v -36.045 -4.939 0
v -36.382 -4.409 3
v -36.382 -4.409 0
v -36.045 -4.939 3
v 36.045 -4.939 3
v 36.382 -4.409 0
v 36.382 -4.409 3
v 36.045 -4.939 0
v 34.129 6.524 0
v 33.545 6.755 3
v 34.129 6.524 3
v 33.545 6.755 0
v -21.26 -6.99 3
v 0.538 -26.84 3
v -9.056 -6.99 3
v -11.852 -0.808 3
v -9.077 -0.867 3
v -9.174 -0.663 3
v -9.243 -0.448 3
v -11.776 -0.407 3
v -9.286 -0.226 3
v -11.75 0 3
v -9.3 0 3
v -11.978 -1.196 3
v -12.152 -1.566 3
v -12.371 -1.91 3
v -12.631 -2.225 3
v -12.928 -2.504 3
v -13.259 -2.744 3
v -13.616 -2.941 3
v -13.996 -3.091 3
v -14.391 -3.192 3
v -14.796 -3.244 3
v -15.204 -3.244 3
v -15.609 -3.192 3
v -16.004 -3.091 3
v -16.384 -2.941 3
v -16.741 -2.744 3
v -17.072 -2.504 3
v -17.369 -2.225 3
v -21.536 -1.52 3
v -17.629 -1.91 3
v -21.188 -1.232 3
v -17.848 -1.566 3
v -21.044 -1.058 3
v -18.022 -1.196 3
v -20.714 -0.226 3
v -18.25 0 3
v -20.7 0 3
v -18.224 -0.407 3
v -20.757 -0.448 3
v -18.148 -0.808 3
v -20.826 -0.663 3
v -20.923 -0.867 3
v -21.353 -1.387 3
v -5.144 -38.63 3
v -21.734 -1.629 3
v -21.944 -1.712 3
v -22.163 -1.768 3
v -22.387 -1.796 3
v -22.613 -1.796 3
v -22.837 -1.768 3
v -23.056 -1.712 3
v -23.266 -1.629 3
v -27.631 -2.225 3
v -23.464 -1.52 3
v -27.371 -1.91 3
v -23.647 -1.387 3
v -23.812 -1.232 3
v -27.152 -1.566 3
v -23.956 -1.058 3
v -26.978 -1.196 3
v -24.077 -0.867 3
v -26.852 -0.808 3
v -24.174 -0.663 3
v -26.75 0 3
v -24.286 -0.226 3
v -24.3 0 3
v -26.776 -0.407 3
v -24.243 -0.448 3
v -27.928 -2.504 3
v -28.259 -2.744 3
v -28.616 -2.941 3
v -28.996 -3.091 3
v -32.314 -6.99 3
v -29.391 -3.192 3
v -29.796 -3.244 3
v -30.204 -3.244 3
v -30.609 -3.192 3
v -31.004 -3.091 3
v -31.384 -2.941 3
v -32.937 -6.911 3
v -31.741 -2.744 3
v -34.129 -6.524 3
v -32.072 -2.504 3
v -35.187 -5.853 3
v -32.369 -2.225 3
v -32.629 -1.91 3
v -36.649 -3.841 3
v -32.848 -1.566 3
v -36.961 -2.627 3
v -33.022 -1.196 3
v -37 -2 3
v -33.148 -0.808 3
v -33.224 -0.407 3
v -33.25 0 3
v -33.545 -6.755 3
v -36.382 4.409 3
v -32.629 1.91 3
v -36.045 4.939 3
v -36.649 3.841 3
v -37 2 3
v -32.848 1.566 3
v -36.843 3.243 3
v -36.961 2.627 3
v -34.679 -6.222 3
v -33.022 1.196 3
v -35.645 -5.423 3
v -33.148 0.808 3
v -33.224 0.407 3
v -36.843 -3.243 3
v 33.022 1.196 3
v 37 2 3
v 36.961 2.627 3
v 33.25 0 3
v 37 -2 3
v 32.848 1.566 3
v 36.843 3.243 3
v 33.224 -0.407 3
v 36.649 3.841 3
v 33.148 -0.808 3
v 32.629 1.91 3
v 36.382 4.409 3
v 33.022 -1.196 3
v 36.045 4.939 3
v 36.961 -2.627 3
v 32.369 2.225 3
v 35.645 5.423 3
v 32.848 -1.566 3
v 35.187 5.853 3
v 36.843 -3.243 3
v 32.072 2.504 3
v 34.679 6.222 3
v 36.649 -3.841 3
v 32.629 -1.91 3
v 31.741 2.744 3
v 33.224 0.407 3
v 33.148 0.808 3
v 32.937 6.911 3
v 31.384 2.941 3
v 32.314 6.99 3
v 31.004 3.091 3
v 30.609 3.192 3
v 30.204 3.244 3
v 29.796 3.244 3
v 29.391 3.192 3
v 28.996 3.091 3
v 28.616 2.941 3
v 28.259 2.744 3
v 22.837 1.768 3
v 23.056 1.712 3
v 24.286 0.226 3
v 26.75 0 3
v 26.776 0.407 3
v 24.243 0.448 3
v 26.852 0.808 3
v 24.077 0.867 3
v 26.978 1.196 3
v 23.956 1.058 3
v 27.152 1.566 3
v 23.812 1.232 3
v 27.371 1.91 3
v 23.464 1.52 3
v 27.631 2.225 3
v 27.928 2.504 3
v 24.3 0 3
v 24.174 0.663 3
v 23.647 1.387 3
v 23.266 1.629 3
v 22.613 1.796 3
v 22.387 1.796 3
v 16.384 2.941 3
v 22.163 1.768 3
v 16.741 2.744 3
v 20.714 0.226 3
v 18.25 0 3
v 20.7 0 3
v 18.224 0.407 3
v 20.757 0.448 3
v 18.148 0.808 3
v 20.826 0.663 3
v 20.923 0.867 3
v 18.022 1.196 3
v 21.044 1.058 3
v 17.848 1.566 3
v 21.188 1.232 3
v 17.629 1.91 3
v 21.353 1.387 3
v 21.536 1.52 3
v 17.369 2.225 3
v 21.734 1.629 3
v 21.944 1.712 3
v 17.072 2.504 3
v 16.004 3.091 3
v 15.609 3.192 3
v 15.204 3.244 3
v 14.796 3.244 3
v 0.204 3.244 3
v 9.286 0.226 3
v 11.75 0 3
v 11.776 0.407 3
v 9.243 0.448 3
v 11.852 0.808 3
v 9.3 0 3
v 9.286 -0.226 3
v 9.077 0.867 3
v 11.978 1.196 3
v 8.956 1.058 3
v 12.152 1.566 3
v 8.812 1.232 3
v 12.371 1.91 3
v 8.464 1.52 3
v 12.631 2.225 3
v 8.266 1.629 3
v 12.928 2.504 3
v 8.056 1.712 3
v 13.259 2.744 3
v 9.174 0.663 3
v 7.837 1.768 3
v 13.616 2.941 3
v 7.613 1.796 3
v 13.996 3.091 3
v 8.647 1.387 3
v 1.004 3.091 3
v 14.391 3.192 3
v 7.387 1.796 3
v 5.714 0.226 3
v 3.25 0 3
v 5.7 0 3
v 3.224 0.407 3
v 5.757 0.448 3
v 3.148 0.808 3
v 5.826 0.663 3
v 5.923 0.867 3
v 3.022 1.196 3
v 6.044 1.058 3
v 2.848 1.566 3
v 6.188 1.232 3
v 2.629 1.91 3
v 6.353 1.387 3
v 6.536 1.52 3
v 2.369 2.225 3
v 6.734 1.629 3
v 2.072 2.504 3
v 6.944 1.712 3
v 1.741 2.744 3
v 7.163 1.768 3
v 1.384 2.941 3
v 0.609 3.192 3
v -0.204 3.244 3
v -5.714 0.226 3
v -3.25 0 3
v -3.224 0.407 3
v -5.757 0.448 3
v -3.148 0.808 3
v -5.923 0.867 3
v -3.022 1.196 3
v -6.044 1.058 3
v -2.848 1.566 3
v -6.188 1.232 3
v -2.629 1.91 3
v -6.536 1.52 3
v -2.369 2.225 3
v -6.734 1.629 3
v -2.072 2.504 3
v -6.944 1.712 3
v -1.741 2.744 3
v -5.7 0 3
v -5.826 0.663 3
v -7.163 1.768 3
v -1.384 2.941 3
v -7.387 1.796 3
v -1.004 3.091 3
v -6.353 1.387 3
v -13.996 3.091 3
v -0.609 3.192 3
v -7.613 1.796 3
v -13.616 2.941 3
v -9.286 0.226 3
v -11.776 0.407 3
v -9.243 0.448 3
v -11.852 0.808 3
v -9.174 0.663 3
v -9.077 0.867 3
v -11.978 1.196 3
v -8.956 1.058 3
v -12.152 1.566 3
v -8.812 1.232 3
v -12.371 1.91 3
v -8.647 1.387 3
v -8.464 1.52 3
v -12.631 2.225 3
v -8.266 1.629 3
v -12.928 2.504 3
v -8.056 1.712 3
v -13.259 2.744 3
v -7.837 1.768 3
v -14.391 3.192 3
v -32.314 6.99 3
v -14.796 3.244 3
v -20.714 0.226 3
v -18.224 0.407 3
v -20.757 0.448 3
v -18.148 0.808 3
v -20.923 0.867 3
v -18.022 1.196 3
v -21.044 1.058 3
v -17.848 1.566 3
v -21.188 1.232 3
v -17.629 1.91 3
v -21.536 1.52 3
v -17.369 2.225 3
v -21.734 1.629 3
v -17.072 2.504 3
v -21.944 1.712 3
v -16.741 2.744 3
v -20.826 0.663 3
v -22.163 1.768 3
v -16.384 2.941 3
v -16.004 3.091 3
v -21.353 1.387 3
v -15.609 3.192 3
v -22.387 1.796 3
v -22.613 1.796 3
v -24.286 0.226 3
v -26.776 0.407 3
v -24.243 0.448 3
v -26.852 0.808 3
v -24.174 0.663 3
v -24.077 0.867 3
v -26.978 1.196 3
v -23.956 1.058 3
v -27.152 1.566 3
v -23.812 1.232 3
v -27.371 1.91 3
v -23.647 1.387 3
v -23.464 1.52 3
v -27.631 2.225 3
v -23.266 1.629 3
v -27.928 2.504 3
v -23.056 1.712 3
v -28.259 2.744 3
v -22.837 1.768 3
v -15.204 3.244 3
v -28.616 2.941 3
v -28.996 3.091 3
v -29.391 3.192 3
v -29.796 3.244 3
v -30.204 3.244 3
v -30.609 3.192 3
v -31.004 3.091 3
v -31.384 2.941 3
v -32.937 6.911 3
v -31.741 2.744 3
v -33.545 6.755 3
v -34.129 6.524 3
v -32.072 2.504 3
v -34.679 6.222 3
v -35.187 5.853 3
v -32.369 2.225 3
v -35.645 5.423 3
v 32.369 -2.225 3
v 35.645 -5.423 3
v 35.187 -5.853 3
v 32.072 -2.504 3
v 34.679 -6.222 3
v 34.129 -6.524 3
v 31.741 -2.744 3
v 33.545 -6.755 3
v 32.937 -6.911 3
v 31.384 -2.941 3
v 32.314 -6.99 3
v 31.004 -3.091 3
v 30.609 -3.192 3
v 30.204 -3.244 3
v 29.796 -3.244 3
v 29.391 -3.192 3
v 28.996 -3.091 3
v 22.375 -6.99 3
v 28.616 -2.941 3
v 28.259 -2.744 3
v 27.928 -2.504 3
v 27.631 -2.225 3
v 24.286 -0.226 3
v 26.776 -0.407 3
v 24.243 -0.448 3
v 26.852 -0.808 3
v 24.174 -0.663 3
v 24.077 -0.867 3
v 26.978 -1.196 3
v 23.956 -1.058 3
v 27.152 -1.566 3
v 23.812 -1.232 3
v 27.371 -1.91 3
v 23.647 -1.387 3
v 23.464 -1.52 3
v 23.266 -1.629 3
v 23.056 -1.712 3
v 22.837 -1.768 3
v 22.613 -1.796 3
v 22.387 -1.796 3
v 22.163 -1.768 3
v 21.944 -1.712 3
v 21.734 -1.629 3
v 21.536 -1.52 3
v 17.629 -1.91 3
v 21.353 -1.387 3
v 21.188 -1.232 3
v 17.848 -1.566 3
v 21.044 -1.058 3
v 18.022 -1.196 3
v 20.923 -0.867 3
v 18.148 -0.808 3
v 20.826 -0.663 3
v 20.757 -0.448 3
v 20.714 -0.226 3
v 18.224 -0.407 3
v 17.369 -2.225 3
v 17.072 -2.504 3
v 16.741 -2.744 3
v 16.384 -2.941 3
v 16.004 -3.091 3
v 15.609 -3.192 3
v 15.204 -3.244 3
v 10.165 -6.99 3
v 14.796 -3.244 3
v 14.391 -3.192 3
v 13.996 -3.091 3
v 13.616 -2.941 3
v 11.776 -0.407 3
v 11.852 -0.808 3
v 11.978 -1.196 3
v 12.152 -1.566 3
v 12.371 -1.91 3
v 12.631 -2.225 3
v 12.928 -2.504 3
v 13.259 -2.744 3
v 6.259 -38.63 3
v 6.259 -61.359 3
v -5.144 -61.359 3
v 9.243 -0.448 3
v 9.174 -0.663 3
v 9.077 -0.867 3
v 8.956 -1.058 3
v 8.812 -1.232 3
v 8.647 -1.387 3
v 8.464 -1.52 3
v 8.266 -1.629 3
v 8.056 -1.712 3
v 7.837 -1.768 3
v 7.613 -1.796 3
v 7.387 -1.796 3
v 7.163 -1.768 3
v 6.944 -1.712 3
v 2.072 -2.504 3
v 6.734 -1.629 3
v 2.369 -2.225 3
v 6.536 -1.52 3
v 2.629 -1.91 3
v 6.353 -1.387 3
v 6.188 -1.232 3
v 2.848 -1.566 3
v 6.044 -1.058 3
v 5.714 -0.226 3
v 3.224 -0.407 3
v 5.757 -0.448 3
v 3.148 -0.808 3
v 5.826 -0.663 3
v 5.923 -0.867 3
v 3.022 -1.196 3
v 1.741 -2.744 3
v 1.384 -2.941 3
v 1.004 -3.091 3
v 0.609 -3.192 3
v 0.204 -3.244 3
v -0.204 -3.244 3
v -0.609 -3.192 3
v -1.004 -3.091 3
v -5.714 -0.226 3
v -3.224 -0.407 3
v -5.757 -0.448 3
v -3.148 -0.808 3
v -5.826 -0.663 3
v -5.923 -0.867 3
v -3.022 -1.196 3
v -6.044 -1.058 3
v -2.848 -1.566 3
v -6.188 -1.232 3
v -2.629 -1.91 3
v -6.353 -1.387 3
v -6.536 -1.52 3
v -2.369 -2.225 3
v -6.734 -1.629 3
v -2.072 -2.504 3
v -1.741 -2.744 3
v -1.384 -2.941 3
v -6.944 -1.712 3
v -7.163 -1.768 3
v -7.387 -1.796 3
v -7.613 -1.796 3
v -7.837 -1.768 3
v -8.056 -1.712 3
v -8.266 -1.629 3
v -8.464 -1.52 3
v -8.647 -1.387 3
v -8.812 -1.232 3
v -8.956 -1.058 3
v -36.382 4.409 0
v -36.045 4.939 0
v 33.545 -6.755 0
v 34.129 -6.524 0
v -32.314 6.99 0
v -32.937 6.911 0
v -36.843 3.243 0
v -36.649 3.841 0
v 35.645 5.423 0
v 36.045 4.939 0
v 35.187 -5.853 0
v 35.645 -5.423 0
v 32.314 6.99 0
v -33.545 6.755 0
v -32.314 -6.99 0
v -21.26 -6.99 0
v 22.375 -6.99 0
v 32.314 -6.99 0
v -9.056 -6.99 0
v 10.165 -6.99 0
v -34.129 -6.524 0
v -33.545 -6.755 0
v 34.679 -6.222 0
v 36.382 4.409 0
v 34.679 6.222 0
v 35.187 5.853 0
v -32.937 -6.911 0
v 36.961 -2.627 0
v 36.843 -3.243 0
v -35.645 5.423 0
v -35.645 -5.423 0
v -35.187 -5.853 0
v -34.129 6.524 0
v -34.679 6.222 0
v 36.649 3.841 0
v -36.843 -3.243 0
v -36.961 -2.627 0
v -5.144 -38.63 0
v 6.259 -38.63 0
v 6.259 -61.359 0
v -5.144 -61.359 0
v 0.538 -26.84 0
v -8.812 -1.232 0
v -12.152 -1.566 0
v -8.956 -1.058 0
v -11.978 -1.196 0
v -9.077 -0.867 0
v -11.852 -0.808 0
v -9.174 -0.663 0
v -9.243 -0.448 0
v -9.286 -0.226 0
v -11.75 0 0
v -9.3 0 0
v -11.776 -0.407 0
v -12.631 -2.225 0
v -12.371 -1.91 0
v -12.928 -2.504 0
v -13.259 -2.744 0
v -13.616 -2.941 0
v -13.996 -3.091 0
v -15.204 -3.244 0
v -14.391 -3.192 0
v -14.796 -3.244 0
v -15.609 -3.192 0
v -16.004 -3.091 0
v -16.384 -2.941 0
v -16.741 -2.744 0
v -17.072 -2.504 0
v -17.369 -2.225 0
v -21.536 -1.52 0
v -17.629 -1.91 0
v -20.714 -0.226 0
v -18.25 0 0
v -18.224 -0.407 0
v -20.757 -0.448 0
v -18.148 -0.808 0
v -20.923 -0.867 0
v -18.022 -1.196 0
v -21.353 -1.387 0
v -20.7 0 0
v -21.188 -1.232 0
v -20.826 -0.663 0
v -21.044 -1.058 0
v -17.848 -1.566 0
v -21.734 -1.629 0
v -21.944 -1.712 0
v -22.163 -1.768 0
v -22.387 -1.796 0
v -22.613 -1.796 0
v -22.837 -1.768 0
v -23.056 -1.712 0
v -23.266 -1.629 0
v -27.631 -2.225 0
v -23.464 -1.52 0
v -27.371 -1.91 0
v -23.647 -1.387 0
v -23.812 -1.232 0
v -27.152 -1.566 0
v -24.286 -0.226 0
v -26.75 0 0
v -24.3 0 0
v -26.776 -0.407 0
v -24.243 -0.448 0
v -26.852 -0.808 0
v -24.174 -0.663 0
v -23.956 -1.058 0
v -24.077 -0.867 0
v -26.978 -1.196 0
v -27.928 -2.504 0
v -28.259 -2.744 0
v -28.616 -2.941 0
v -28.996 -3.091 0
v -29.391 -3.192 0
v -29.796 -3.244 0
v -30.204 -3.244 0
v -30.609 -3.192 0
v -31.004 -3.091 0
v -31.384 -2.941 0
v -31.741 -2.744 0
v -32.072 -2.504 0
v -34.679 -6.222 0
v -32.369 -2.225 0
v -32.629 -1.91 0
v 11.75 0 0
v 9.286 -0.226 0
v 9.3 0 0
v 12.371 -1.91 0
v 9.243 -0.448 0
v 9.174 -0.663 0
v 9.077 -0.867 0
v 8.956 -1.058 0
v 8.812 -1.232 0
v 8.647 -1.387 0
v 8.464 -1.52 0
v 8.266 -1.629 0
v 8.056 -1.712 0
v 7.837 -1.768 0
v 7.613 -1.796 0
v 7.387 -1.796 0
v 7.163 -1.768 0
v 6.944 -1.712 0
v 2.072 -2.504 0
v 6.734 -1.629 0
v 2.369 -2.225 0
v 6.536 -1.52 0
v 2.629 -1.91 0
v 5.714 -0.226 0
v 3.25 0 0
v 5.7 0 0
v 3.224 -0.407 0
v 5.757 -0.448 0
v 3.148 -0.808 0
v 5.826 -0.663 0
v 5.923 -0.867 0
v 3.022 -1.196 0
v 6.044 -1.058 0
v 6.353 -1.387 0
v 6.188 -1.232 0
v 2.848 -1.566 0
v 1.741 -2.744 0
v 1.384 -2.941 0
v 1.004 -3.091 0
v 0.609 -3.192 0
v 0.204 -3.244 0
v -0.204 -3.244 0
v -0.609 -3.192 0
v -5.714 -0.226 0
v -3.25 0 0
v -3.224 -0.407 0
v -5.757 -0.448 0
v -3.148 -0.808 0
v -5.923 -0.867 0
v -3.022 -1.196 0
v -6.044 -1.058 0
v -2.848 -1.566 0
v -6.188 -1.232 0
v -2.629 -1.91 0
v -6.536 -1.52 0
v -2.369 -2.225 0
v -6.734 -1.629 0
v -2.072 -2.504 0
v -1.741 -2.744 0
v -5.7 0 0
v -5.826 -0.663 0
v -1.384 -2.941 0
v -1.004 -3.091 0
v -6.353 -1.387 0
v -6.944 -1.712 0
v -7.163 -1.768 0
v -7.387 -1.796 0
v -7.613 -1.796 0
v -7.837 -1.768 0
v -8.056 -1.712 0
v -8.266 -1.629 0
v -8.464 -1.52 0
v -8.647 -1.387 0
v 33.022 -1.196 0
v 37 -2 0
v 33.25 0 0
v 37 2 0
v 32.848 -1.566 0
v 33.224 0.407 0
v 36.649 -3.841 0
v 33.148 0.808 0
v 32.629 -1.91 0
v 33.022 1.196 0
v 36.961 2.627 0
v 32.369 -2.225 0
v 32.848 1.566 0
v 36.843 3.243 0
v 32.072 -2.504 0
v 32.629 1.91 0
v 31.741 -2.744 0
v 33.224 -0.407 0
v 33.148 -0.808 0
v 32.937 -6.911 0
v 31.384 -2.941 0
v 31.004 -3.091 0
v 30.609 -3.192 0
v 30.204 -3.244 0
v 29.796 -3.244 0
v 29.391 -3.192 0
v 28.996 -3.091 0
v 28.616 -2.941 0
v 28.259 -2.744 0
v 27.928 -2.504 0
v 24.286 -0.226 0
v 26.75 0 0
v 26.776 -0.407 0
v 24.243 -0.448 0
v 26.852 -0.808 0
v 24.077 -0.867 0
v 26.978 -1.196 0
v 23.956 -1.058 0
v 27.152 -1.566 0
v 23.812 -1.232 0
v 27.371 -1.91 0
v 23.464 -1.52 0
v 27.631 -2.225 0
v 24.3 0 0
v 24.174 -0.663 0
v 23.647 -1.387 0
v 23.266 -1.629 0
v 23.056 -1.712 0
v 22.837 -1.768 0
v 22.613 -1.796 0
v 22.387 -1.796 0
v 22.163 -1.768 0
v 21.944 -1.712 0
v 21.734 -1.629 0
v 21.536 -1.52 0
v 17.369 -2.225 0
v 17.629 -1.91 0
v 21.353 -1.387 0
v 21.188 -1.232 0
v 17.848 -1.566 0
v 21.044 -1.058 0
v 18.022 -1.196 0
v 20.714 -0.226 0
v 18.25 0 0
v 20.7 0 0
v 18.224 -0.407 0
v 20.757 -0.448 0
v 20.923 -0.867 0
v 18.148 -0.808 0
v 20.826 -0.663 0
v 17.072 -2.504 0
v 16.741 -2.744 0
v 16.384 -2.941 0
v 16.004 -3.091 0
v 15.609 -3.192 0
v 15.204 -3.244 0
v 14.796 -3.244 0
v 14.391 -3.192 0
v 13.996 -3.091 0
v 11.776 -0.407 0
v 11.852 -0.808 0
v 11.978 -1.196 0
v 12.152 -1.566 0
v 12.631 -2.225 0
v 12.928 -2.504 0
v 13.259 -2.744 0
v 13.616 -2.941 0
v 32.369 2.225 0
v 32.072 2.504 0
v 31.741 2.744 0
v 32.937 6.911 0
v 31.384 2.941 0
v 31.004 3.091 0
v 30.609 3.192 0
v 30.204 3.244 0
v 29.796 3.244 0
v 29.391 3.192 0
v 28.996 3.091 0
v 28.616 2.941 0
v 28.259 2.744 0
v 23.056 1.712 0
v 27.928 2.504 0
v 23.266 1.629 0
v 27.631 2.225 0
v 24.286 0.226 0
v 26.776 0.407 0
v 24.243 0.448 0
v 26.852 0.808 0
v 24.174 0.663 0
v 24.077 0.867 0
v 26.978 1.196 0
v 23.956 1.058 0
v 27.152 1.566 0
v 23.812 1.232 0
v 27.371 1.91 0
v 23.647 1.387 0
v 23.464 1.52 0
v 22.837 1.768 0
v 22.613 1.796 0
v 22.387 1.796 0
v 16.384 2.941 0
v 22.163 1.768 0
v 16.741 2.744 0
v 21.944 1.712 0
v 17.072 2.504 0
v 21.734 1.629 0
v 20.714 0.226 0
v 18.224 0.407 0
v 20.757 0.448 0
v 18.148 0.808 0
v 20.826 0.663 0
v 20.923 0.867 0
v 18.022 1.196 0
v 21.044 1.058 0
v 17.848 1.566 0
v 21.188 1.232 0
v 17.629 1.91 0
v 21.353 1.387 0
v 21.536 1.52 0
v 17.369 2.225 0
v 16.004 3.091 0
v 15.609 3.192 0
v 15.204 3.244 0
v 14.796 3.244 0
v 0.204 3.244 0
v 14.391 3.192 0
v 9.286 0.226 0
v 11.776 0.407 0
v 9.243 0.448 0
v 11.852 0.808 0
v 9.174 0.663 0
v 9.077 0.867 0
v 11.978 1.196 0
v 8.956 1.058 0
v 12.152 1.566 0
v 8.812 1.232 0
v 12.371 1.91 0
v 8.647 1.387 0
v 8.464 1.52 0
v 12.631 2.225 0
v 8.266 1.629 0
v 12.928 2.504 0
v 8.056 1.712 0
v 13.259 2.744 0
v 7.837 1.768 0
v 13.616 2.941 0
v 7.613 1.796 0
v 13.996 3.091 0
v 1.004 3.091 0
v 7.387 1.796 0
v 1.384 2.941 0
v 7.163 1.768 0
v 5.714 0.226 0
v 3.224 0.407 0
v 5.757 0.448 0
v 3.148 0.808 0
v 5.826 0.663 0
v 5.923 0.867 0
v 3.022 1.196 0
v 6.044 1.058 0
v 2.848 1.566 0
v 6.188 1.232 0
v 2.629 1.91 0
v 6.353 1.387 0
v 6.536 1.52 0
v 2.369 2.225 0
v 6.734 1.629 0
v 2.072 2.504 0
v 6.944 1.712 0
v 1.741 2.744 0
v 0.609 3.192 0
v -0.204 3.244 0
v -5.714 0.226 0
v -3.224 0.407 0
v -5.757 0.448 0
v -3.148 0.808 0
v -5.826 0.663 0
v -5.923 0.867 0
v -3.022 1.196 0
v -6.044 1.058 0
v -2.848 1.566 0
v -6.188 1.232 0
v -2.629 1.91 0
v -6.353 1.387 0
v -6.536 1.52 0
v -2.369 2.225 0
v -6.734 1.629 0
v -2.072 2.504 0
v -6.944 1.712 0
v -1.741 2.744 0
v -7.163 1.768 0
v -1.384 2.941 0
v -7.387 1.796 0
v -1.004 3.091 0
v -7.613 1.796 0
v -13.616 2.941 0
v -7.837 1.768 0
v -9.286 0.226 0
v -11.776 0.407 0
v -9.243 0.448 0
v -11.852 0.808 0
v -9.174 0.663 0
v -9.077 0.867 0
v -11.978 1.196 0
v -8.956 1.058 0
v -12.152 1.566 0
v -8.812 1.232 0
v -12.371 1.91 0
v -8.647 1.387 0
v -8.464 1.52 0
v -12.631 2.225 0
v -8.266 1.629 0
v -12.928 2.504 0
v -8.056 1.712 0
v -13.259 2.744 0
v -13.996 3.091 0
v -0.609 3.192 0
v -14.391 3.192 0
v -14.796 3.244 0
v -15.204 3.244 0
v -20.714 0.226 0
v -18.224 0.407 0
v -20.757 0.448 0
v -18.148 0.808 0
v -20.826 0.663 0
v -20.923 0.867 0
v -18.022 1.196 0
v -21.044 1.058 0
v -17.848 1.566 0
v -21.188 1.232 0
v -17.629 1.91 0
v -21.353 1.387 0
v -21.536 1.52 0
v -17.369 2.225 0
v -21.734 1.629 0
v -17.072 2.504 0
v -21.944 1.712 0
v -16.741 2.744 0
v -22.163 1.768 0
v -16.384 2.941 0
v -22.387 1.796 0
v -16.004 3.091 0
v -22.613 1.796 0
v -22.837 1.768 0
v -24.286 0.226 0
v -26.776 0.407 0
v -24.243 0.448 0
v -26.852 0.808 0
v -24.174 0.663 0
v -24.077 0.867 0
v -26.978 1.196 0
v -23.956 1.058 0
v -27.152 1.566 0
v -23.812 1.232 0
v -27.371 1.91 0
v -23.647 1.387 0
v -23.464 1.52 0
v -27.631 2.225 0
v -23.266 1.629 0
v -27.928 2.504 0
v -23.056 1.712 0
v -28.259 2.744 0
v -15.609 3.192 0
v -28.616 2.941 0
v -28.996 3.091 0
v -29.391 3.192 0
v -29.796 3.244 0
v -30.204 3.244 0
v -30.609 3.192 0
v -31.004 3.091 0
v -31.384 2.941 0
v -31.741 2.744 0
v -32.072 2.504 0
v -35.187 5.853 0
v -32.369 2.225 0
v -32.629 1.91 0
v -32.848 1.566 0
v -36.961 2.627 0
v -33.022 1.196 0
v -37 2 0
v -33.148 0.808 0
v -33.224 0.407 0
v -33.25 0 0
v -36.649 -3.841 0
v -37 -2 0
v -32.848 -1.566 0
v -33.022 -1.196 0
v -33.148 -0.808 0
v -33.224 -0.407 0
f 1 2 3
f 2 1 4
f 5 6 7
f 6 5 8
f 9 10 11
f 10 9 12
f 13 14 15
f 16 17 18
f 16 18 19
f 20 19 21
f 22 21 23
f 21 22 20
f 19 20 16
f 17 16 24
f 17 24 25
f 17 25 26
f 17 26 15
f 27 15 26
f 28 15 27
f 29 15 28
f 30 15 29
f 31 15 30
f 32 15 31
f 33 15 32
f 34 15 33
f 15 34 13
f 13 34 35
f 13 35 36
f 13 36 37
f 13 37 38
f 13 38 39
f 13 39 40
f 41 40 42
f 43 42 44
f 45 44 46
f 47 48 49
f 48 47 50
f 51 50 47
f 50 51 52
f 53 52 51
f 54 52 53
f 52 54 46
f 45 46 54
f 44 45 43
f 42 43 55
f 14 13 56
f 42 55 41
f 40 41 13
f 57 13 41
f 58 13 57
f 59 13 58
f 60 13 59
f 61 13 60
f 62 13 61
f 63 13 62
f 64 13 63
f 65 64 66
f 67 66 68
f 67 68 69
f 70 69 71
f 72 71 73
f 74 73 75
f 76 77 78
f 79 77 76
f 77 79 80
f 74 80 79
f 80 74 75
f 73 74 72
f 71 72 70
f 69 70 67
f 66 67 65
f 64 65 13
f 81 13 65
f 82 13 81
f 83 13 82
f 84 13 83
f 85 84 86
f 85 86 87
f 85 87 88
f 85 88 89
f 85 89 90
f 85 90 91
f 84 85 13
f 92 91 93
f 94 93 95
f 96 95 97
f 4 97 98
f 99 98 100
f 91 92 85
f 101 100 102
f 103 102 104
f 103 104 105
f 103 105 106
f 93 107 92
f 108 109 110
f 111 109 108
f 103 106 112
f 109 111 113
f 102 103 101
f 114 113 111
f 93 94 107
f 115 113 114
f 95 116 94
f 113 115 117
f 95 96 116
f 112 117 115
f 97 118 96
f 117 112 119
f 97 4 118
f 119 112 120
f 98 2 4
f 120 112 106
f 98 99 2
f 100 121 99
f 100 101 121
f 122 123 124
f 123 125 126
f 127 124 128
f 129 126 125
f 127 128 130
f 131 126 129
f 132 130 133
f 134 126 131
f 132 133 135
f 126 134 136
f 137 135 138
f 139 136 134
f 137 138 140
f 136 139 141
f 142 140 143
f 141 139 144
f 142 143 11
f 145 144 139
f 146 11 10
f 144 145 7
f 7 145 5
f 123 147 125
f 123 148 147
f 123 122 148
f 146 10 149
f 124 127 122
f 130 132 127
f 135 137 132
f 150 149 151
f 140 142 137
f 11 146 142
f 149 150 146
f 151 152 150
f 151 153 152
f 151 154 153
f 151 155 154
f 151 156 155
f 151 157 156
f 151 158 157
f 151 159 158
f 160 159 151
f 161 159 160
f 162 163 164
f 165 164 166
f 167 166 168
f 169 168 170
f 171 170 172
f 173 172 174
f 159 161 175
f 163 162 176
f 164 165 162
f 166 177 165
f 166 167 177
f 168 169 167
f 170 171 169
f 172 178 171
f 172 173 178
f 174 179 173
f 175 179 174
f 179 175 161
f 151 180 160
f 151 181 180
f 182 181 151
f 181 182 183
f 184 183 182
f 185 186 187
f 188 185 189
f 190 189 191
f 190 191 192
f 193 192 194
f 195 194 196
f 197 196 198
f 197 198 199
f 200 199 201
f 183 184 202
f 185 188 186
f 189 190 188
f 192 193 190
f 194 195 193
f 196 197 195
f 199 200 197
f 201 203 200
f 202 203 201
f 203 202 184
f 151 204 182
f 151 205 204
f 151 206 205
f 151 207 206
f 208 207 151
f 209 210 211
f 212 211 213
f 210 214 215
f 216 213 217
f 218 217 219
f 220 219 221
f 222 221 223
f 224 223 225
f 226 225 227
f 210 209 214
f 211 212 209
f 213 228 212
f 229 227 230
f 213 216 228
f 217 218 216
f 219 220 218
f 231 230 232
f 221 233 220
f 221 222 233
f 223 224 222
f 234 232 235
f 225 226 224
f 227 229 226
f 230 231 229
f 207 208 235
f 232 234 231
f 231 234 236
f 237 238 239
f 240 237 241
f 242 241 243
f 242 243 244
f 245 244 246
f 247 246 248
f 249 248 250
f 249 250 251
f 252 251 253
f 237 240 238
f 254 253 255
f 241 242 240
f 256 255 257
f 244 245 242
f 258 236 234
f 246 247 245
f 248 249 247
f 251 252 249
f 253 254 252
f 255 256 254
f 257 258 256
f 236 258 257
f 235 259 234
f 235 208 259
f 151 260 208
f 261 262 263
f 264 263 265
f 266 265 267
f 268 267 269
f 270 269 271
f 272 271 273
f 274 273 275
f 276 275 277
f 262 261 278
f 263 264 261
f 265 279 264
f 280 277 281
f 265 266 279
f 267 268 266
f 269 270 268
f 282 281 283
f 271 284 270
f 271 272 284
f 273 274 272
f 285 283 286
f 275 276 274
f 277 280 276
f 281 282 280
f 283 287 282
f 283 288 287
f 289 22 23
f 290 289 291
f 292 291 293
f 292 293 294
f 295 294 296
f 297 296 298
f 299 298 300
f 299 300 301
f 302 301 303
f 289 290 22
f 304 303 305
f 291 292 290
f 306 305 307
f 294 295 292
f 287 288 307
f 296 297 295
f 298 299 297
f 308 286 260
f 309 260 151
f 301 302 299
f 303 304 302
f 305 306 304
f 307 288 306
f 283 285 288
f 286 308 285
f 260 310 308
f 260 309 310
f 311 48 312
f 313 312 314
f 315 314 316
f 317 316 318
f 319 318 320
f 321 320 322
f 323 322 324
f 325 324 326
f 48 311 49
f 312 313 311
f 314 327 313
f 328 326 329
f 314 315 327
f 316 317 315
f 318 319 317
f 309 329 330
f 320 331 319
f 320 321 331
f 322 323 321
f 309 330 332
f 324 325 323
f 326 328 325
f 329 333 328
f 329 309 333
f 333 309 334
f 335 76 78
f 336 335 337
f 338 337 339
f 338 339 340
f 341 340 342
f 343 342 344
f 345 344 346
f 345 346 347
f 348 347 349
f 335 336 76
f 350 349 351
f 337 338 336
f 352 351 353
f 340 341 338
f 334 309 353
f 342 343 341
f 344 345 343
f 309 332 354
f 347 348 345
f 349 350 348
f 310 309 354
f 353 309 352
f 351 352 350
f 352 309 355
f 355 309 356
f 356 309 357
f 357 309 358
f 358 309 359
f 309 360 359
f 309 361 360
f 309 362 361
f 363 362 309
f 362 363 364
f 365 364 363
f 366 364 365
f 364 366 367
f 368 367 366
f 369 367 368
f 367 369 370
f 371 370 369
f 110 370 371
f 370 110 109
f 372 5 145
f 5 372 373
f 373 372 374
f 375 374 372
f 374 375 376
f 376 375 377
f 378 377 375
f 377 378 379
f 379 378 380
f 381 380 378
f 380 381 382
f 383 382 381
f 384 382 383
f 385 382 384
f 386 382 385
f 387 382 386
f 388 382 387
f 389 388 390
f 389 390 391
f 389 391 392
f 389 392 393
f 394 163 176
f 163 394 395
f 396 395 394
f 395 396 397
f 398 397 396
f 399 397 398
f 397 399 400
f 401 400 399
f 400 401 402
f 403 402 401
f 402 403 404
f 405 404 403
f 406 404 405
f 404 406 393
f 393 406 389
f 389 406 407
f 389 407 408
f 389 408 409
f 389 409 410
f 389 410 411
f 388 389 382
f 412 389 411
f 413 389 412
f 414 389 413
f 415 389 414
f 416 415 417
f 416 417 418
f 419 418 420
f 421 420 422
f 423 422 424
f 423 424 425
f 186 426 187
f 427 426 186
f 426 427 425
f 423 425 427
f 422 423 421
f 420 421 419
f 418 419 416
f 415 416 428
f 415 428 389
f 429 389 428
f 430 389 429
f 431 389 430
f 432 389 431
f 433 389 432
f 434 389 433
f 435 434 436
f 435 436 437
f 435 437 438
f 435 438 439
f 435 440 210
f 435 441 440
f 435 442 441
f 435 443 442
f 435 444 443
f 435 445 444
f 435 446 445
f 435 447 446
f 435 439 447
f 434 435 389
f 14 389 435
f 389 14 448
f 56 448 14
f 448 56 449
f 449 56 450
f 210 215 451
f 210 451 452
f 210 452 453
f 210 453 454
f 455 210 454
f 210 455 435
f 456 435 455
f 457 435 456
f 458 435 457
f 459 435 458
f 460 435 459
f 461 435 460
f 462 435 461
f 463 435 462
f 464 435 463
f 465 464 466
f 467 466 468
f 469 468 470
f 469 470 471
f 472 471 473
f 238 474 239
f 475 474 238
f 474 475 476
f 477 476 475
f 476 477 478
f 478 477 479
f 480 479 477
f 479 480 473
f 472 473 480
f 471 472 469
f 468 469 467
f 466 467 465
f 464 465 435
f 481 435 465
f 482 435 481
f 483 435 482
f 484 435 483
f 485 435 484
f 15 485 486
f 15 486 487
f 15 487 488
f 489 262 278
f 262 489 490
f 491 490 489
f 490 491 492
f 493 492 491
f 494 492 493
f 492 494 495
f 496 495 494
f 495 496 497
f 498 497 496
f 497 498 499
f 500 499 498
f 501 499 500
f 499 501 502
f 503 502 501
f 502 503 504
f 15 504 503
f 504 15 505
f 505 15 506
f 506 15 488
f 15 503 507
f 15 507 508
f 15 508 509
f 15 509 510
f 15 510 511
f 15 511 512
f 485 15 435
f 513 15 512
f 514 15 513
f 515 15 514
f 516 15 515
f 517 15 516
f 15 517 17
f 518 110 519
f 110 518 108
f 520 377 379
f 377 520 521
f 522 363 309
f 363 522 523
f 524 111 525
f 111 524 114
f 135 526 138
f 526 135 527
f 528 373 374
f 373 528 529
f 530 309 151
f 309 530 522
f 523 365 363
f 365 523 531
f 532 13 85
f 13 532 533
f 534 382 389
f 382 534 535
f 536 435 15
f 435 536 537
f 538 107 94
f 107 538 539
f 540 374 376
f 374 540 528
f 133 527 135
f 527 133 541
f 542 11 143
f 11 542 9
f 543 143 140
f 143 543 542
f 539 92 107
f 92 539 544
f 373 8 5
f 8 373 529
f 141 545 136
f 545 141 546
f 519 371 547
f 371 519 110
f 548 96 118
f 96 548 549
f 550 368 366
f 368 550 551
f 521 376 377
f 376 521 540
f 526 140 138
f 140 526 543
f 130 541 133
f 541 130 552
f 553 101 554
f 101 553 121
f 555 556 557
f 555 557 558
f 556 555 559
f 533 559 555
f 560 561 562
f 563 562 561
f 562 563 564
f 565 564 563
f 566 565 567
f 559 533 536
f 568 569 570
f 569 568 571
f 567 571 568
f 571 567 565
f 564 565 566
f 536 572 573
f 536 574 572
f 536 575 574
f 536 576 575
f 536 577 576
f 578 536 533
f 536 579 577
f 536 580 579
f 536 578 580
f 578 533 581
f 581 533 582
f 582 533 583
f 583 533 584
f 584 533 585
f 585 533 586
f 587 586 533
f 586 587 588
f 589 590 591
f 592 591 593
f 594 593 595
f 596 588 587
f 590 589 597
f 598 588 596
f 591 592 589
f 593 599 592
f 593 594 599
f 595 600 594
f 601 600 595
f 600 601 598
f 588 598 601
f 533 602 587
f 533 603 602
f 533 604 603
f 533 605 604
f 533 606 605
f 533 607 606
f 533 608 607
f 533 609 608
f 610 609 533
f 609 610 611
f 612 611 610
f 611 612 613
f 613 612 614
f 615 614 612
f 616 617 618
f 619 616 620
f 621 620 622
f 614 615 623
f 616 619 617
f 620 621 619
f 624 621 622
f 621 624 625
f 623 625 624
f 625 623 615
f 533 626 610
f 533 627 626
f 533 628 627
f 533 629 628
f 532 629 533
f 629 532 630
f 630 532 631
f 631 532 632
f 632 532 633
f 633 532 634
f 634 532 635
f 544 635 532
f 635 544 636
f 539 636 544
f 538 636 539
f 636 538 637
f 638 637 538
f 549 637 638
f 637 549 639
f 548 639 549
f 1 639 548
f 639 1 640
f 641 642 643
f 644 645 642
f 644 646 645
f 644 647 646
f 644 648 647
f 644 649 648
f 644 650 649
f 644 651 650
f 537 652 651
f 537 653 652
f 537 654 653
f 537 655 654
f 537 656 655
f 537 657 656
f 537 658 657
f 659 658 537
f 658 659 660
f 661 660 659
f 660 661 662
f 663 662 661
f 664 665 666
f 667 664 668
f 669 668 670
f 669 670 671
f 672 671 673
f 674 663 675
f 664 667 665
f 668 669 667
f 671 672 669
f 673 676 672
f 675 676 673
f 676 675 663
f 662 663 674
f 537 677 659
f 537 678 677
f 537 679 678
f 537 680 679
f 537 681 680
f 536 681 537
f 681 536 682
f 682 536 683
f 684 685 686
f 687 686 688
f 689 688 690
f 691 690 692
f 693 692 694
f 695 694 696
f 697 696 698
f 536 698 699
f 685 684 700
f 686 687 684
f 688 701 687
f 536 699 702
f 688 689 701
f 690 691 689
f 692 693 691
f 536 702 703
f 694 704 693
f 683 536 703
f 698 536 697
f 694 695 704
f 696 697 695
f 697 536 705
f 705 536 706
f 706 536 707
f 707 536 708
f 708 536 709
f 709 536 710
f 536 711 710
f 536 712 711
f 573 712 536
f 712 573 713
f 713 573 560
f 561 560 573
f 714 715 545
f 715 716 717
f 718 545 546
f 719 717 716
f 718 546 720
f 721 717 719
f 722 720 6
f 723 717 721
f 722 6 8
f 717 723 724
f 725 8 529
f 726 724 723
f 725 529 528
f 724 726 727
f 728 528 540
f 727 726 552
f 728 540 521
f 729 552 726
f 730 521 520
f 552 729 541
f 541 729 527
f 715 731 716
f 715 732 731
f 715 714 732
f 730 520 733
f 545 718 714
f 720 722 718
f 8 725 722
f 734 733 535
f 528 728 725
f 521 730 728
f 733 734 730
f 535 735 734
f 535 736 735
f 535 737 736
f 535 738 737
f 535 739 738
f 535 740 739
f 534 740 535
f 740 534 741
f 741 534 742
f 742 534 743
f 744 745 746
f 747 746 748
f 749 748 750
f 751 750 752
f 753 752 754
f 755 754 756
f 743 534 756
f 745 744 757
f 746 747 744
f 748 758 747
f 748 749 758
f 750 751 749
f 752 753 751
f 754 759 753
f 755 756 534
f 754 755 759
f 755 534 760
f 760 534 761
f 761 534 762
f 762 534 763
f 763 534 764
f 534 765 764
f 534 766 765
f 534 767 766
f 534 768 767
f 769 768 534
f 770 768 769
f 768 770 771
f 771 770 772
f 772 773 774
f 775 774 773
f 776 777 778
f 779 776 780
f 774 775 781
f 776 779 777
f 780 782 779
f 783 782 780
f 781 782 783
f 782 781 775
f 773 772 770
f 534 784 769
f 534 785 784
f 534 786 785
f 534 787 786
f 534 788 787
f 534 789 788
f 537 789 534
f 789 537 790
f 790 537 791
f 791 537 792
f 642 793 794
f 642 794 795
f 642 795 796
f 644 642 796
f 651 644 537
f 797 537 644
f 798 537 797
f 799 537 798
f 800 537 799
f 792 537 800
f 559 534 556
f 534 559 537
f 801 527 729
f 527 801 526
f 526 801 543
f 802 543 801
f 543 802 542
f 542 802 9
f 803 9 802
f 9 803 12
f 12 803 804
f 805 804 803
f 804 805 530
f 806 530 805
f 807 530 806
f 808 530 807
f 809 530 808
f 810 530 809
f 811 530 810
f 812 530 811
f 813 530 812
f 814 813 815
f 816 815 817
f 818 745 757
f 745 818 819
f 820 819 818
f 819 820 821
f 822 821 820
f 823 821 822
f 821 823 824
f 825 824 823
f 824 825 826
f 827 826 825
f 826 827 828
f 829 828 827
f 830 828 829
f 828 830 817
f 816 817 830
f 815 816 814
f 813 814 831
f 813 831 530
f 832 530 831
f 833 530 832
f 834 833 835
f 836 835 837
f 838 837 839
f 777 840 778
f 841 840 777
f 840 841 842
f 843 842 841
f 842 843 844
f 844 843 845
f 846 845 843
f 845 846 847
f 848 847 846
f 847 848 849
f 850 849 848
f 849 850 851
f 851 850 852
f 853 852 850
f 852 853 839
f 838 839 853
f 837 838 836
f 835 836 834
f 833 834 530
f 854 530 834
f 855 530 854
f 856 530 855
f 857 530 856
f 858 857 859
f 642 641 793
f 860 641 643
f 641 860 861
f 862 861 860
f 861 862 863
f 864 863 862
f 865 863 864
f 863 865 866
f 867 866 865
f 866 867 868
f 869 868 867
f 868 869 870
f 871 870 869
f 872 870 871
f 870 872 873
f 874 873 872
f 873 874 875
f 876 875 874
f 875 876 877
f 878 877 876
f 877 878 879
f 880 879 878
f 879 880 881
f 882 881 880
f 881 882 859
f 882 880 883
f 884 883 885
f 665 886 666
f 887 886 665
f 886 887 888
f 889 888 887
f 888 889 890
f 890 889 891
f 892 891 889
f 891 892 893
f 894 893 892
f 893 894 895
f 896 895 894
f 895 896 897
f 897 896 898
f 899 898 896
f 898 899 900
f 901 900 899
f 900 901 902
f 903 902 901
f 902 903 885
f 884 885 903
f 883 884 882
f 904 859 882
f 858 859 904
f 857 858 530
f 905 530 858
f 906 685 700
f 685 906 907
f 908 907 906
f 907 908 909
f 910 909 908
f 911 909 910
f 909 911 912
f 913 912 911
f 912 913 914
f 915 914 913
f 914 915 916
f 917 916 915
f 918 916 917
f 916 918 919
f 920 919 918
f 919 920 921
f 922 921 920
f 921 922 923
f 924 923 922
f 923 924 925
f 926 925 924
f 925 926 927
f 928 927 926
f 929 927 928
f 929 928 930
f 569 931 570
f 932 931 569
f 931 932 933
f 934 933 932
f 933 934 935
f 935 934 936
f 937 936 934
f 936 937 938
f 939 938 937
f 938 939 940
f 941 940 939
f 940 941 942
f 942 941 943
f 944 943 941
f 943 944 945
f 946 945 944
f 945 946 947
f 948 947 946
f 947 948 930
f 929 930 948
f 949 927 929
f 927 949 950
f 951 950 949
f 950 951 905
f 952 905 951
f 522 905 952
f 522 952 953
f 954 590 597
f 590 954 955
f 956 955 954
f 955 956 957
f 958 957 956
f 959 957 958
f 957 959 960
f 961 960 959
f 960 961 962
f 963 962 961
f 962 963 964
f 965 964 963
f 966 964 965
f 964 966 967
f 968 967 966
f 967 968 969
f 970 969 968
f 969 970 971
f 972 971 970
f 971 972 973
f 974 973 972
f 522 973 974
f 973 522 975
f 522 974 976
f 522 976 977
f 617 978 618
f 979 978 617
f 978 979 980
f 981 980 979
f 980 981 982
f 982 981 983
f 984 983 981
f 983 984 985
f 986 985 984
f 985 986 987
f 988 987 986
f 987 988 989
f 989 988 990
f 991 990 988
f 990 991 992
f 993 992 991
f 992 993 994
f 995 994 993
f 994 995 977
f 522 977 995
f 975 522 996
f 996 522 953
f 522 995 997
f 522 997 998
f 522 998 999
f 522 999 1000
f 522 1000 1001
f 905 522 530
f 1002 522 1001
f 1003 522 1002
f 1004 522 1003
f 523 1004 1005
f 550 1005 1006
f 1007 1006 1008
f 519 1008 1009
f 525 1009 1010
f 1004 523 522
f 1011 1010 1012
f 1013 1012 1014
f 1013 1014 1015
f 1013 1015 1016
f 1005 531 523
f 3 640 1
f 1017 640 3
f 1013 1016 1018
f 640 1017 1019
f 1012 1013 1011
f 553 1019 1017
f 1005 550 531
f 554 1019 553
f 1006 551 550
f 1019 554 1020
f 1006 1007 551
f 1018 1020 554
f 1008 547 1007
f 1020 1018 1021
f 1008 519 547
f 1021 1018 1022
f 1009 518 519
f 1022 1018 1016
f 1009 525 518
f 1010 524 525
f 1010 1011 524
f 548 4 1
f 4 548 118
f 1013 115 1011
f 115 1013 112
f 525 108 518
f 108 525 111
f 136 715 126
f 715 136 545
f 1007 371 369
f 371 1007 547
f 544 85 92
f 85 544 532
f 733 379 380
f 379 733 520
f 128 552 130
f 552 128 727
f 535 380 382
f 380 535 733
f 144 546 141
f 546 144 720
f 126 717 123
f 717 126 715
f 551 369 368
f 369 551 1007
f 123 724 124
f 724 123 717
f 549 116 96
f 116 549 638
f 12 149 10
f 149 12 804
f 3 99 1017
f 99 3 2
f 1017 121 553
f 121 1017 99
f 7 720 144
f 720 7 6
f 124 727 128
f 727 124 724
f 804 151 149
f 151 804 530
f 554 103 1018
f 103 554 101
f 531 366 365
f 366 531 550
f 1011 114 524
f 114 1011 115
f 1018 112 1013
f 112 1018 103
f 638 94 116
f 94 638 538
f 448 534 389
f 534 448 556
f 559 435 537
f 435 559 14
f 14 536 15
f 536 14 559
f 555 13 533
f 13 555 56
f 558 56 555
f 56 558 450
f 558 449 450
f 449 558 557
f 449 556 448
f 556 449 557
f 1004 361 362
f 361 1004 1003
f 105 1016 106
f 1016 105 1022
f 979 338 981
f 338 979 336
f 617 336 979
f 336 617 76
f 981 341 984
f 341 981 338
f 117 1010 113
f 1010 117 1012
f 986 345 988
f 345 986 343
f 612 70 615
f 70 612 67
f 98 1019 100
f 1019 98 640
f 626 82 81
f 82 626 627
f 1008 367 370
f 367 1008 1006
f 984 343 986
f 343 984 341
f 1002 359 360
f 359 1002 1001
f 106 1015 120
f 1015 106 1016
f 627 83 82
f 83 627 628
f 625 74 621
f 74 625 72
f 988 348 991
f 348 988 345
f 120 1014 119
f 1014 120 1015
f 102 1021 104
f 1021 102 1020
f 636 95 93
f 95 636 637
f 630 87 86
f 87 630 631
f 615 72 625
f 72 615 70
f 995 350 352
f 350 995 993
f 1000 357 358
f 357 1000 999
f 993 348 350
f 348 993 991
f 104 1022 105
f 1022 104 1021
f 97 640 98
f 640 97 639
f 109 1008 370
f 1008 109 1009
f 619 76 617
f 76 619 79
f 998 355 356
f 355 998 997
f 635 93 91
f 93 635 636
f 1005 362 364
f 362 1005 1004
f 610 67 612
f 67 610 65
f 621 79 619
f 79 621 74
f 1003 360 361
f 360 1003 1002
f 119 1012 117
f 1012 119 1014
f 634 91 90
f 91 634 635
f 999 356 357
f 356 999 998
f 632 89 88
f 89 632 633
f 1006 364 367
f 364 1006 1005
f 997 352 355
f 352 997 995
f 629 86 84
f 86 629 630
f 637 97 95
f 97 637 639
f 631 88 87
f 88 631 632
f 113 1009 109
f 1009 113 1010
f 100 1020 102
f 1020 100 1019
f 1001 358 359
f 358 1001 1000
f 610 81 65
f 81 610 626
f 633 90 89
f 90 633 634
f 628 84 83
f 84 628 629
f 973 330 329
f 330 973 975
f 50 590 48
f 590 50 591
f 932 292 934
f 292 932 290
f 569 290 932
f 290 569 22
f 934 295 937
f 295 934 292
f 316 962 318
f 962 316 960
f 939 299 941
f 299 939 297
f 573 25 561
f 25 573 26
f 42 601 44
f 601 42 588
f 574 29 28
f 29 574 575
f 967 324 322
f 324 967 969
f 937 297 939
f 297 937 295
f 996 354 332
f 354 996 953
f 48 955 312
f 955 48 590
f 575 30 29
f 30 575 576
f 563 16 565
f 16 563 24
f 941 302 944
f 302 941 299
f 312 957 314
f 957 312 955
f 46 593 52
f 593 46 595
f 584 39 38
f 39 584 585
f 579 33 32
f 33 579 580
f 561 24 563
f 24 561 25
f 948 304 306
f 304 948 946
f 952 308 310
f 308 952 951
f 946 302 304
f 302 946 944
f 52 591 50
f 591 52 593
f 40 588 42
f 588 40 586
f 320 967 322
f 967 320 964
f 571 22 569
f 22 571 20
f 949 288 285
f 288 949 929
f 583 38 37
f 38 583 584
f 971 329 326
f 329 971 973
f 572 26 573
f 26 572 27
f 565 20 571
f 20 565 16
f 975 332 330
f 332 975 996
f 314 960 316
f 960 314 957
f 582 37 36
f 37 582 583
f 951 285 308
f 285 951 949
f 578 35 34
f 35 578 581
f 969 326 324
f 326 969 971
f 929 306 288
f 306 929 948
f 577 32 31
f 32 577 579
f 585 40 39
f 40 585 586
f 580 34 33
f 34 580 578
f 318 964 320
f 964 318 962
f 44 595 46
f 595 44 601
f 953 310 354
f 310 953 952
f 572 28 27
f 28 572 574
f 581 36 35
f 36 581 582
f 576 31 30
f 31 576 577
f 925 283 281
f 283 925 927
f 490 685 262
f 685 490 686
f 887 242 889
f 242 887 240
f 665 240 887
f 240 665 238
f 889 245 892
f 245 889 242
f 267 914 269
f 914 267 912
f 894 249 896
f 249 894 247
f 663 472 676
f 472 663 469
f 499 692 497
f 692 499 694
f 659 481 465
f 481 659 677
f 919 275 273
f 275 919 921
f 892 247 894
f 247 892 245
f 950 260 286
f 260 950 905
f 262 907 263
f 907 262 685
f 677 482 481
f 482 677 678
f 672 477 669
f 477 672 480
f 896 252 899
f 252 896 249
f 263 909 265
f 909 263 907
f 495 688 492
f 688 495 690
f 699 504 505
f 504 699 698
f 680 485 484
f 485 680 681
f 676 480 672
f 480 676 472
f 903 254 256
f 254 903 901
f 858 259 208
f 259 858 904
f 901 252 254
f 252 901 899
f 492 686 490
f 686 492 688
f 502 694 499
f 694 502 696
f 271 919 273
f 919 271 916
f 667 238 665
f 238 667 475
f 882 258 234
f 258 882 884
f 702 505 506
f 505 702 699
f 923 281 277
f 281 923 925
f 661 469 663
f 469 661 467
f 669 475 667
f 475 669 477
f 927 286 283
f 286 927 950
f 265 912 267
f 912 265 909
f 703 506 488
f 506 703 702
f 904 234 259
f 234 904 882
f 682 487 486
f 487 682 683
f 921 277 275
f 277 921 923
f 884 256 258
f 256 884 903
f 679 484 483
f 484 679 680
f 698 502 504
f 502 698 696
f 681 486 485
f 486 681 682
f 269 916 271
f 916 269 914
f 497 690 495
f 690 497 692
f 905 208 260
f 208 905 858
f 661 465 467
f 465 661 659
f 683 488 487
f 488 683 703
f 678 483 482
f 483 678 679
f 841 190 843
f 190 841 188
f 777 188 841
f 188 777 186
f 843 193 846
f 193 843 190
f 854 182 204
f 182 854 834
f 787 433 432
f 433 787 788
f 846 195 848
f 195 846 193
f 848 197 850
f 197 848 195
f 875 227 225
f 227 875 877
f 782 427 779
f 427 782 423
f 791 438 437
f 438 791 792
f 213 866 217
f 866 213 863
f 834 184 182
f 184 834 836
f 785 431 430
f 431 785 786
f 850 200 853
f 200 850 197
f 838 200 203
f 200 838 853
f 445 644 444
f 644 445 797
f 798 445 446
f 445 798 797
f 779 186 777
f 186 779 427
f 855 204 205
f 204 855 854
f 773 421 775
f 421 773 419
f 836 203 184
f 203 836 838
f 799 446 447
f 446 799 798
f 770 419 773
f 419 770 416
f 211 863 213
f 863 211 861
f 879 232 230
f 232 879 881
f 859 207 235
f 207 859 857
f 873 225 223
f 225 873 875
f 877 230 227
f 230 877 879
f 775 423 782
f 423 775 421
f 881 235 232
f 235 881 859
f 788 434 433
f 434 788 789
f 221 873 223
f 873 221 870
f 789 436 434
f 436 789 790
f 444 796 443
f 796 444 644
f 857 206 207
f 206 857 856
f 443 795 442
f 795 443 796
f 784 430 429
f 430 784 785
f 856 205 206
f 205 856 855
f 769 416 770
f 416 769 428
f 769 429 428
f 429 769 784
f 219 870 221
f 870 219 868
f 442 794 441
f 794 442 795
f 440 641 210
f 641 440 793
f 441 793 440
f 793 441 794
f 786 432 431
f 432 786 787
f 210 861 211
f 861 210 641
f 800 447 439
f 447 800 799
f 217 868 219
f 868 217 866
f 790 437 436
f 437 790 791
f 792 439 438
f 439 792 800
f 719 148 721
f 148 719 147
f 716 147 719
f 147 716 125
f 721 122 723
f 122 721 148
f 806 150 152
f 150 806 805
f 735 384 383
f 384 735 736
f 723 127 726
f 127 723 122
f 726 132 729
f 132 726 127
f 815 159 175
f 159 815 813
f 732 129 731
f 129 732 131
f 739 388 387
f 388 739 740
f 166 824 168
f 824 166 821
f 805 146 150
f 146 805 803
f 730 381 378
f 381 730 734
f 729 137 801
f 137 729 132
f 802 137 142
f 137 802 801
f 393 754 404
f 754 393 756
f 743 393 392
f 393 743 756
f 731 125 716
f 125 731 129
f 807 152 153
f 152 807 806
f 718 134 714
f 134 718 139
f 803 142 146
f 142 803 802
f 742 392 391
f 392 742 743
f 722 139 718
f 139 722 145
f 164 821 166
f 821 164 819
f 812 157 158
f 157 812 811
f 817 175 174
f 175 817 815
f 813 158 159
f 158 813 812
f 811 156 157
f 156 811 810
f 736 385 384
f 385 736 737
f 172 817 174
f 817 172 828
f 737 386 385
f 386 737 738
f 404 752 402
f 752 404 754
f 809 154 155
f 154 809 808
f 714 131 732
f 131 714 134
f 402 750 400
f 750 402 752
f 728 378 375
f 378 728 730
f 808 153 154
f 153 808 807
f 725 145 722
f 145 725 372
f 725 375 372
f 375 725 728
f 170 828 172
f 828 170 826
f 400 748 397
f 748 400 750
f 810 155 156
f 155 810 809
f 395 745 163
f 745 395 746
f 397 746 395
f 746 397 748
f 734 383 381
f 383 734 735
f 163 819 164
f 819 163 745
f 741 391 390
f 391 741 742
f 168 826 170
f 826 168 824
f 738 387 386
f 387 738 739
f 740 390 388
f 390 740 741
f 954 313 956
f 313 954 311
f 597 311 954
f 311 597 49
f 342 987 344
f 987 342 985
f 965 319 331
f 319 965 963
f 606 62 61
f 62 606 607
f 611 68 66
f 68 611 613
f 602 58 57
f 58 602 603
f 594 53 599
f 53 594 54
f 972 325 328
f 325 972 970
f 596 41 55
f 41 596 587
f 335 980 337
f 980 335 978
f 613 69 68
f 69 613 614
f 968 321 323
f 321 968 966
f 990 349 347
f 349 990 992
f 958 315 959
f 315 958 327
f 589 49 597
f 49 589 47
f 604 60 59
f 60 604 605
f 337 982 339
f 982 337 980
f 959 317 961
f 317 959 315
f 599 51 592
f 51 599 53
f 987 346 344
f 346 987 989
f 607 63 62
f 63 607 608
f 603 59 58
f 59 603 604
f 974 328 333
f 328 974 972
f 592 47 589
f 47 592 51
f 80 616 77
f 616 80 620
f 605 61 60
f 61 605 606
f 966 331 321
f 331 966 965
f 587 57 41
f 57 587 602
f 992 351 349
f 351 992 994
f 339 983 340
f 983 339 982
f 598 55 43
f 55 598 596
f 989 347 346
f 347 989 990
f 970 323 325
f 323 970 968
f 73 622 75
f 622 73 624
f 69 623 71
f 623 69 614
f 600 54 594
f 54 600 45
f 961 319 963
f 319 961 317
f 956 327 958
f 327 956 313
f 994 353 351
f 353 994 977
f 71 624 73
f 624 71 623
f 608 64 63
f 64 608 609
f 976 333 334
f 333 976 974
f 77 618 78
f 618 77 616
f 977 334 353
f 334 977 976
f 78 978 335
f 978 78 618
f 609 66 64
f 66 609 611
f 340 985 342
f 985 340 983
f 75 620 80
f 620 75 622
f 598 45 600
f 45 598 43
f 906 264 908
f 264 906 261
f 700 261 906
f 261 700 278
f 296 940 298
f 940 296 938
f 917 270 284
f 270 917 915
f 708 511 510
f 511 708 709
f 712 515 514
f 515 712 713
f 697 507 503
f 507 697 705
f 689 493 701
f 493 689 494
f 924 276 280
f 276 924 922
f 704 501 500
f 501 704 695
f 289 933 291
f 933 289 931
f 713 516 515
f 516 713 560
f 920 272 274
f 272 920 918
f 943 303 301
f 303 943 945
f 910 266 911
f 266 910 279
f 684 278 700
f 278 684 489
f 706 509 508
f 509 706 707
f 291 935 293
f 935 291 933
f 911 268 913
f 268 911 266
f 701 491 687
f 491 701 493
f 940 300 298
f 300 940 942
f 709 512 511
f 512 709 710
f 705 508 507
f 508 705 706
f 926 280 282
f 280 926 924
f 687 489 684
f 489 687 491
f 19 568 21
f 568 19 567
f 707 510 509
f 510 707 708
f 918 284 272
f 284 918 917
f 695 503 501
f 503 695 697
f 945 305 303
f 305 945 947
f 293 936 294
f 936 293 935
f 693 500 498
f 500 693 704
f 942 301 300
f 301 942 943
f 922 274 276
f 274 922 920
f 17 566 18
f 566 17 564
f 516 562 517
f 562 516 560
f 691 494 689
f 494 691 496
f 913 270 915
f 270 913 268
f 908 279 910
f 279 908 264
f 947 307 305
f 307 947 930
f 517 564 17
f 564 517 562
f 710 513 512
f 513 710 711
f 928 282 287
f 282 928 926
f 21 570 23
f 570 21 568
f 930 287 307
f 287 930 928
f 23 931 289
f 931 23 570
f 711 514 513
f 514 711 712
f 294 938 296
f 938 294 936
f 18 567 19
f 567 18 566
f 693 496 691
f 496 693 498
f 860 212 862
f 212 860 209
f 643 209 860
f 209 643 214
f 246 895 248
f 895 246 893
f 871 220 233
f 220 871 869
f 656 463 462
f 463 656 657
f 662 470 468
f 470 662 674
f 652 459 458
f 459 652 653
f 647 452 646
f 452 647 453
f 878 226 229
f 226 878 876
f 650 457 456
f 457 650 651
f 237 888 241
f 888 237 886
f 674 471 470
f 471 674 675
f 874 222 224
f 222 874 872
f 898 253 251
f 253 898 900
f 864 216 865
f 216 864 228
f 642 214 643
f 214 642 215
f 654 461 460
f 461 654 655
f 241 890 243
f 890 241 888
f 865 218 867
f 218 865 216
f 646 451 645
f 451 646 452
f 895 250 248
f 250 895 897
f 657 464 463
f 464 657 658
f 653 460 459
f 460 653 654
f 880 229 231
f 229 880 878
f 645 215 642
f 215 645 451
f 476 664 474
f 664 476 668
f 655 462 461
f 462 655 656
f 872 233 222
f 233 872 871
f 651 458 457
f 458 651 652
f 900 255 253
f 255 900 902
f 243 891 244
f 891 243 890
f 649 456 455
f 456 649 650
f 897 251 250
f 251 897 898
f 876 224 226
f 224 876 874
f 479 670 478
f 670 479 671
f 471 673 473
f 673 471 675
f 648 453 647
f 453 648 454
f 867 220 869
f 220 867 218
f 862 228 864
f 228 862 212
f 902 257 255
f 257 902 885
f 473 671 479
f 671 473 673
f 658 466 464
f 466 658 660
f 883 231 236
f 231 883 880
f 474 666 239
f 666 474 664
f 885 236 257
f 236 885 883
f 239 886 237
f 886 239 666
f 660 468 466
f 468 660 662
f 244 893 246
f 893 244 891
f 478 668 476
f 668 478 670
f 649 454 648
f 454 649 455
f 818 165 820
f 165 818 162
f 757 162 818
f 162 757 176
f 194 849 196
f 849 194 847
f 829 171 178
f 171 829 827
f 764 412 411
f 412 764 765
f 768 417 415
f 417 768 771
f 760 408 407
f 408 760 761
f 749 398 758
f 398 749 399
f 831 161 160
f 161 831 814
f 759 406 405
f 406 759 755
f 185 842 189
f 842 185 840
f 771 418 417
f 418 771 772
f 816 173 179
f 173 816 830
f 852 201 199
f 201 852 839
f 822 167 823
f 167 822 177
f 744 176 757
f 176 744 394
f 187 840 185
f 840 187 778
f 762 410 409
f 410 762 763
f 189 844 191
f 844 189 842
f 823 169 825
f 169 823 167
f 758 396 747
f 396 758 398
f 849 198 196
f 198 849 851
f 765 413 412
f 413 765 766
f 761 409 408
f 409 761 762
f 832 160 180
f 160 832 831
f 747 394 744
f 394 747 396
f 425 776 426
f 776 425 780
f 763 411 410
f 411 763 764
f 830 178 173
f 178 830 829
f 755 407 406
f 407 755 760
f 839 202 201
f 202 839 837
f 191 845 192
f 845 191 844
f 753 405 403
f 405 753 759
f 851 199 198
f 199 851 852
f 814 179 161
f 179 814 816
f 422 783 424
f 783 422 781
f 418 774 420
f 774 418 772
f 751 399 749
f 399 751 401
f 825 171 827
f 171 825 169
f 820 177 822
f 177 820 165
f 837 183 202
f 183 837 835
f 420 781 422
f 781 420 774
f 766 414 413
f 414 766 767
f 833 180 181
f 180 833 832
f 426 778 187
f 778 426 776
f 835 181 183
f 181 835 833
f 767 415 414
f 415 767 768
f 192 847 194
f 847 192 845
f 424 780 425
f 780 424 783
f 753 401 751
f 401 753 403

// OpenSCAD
$fn = 50;


difference() {
	union() {
		hull() {
			translate(v = [-32.0000000000, 2.0000000000, 0]) {
				cylinder(h = 3, r = 5);
			}
			translate(v = [32.0000000000, 2.0000000000, 0]) {
				cylinder(h = 3, r = 5);
			}
			translate(v = [-32.0000000000, -2.0000000000, 0]) {
				cylinder(h = 3, r = 5);
			}
			translate(v = [32.0000000000, -2.0000000000, 0]) {
				cylinder(h = 3, r = 5);
			}
		}
		translate(v = [0, -5, 0]) {
			linear_extrude(height = 3) {
				text(font = "DejaVu Sans Mono:style=Bold", halign = "center", size = 57.0000000000, text = "Y", valign = "top");
			}
		}
	}
	union() {
		translate(v = [-30.0000000000, 0.0000000000, 0]) {
			translate(v = [0, 0, -100]) {
				cylinder(h = 200, r = 3.2500000000);
			}
		}
		translate(v = [-15.0000000000, 0.0000000000, 0]) {
			translate(v = [0, 0, -100]) {
				cylinder(h = 200, r = 3.2500000000);
			}
		}
		translate(v = [0, 0, -100]) {
			cylinder(h = 200, r = 3.2500000000);
		}
		translate(v = [15.0000000000, 0.0000000000, 0]) {
			translate(v = [0, 0, -100]) {
				cylinder(h = 200, r = 3.2500000000);
			}
		}
		translate(v = [30.0000000000, 0.0000000000, 0]) {
			translate(v = [0, 0, -100]) {
				cylinder(h = 200, r = 3.2500000000);
			}
		}
		translate(v = [-30.0000000000, 0.0000000000, 0]) {
			translate(v = [0, 0, -100]) {
				cylinder(h = 200, r = 1.8000000000);
			}
		}
		translate(v = [-22.5000000000, 0.0000000000, 0]) {
			translate(v = [0, 0, -100]) {
				cylinder(h = 200, r = 1.8000000000);
			}
		}
		translate(v = [-15.0000000000, 0.0000000000, 0]) {
			translate(v = [0, 0, -100]) {
				cylinder(h = 200, r = 1.8000000000);
			}
		}
		translate(v = [-7.5000000000, 0.0000000000, 0]) {
			translate(v = [0, 0, -100]) {
				cylinder(h = 200, r = 1.8000000000);
			}
		}
		translate(v = [0, 0, -100]) {
			cylinder(h = 200, r = 1.8000000000);
		}
		translate(v = [7.5000000000, 0.0000000000, 0]) {
			translate(v = [0, 0, -100]) {
				cylinder(h = 200, r = 1.8000000000);
			}
		}
		translate(v = [15.0000000000, 0.0000000000, 0]) {
			translate(v = [0, 0, -100]) {
				cylinder(h = 200, r = 1.8000000000);
			}
		}
		translate(v = [22.5000000000, 0.0000000000, 0]) {
			translate(v = [0, 0, -100]) {
				cylinder(h = 200, r = 1.8000000000);
			}
		}
		translate(v = [30.0000000000, 0.0000000000, 0]) {
			translate(v = [0, 0, -100]) {
				cylinder(h = 200, r = 1.8000000000);
			}
		}
	}
}
